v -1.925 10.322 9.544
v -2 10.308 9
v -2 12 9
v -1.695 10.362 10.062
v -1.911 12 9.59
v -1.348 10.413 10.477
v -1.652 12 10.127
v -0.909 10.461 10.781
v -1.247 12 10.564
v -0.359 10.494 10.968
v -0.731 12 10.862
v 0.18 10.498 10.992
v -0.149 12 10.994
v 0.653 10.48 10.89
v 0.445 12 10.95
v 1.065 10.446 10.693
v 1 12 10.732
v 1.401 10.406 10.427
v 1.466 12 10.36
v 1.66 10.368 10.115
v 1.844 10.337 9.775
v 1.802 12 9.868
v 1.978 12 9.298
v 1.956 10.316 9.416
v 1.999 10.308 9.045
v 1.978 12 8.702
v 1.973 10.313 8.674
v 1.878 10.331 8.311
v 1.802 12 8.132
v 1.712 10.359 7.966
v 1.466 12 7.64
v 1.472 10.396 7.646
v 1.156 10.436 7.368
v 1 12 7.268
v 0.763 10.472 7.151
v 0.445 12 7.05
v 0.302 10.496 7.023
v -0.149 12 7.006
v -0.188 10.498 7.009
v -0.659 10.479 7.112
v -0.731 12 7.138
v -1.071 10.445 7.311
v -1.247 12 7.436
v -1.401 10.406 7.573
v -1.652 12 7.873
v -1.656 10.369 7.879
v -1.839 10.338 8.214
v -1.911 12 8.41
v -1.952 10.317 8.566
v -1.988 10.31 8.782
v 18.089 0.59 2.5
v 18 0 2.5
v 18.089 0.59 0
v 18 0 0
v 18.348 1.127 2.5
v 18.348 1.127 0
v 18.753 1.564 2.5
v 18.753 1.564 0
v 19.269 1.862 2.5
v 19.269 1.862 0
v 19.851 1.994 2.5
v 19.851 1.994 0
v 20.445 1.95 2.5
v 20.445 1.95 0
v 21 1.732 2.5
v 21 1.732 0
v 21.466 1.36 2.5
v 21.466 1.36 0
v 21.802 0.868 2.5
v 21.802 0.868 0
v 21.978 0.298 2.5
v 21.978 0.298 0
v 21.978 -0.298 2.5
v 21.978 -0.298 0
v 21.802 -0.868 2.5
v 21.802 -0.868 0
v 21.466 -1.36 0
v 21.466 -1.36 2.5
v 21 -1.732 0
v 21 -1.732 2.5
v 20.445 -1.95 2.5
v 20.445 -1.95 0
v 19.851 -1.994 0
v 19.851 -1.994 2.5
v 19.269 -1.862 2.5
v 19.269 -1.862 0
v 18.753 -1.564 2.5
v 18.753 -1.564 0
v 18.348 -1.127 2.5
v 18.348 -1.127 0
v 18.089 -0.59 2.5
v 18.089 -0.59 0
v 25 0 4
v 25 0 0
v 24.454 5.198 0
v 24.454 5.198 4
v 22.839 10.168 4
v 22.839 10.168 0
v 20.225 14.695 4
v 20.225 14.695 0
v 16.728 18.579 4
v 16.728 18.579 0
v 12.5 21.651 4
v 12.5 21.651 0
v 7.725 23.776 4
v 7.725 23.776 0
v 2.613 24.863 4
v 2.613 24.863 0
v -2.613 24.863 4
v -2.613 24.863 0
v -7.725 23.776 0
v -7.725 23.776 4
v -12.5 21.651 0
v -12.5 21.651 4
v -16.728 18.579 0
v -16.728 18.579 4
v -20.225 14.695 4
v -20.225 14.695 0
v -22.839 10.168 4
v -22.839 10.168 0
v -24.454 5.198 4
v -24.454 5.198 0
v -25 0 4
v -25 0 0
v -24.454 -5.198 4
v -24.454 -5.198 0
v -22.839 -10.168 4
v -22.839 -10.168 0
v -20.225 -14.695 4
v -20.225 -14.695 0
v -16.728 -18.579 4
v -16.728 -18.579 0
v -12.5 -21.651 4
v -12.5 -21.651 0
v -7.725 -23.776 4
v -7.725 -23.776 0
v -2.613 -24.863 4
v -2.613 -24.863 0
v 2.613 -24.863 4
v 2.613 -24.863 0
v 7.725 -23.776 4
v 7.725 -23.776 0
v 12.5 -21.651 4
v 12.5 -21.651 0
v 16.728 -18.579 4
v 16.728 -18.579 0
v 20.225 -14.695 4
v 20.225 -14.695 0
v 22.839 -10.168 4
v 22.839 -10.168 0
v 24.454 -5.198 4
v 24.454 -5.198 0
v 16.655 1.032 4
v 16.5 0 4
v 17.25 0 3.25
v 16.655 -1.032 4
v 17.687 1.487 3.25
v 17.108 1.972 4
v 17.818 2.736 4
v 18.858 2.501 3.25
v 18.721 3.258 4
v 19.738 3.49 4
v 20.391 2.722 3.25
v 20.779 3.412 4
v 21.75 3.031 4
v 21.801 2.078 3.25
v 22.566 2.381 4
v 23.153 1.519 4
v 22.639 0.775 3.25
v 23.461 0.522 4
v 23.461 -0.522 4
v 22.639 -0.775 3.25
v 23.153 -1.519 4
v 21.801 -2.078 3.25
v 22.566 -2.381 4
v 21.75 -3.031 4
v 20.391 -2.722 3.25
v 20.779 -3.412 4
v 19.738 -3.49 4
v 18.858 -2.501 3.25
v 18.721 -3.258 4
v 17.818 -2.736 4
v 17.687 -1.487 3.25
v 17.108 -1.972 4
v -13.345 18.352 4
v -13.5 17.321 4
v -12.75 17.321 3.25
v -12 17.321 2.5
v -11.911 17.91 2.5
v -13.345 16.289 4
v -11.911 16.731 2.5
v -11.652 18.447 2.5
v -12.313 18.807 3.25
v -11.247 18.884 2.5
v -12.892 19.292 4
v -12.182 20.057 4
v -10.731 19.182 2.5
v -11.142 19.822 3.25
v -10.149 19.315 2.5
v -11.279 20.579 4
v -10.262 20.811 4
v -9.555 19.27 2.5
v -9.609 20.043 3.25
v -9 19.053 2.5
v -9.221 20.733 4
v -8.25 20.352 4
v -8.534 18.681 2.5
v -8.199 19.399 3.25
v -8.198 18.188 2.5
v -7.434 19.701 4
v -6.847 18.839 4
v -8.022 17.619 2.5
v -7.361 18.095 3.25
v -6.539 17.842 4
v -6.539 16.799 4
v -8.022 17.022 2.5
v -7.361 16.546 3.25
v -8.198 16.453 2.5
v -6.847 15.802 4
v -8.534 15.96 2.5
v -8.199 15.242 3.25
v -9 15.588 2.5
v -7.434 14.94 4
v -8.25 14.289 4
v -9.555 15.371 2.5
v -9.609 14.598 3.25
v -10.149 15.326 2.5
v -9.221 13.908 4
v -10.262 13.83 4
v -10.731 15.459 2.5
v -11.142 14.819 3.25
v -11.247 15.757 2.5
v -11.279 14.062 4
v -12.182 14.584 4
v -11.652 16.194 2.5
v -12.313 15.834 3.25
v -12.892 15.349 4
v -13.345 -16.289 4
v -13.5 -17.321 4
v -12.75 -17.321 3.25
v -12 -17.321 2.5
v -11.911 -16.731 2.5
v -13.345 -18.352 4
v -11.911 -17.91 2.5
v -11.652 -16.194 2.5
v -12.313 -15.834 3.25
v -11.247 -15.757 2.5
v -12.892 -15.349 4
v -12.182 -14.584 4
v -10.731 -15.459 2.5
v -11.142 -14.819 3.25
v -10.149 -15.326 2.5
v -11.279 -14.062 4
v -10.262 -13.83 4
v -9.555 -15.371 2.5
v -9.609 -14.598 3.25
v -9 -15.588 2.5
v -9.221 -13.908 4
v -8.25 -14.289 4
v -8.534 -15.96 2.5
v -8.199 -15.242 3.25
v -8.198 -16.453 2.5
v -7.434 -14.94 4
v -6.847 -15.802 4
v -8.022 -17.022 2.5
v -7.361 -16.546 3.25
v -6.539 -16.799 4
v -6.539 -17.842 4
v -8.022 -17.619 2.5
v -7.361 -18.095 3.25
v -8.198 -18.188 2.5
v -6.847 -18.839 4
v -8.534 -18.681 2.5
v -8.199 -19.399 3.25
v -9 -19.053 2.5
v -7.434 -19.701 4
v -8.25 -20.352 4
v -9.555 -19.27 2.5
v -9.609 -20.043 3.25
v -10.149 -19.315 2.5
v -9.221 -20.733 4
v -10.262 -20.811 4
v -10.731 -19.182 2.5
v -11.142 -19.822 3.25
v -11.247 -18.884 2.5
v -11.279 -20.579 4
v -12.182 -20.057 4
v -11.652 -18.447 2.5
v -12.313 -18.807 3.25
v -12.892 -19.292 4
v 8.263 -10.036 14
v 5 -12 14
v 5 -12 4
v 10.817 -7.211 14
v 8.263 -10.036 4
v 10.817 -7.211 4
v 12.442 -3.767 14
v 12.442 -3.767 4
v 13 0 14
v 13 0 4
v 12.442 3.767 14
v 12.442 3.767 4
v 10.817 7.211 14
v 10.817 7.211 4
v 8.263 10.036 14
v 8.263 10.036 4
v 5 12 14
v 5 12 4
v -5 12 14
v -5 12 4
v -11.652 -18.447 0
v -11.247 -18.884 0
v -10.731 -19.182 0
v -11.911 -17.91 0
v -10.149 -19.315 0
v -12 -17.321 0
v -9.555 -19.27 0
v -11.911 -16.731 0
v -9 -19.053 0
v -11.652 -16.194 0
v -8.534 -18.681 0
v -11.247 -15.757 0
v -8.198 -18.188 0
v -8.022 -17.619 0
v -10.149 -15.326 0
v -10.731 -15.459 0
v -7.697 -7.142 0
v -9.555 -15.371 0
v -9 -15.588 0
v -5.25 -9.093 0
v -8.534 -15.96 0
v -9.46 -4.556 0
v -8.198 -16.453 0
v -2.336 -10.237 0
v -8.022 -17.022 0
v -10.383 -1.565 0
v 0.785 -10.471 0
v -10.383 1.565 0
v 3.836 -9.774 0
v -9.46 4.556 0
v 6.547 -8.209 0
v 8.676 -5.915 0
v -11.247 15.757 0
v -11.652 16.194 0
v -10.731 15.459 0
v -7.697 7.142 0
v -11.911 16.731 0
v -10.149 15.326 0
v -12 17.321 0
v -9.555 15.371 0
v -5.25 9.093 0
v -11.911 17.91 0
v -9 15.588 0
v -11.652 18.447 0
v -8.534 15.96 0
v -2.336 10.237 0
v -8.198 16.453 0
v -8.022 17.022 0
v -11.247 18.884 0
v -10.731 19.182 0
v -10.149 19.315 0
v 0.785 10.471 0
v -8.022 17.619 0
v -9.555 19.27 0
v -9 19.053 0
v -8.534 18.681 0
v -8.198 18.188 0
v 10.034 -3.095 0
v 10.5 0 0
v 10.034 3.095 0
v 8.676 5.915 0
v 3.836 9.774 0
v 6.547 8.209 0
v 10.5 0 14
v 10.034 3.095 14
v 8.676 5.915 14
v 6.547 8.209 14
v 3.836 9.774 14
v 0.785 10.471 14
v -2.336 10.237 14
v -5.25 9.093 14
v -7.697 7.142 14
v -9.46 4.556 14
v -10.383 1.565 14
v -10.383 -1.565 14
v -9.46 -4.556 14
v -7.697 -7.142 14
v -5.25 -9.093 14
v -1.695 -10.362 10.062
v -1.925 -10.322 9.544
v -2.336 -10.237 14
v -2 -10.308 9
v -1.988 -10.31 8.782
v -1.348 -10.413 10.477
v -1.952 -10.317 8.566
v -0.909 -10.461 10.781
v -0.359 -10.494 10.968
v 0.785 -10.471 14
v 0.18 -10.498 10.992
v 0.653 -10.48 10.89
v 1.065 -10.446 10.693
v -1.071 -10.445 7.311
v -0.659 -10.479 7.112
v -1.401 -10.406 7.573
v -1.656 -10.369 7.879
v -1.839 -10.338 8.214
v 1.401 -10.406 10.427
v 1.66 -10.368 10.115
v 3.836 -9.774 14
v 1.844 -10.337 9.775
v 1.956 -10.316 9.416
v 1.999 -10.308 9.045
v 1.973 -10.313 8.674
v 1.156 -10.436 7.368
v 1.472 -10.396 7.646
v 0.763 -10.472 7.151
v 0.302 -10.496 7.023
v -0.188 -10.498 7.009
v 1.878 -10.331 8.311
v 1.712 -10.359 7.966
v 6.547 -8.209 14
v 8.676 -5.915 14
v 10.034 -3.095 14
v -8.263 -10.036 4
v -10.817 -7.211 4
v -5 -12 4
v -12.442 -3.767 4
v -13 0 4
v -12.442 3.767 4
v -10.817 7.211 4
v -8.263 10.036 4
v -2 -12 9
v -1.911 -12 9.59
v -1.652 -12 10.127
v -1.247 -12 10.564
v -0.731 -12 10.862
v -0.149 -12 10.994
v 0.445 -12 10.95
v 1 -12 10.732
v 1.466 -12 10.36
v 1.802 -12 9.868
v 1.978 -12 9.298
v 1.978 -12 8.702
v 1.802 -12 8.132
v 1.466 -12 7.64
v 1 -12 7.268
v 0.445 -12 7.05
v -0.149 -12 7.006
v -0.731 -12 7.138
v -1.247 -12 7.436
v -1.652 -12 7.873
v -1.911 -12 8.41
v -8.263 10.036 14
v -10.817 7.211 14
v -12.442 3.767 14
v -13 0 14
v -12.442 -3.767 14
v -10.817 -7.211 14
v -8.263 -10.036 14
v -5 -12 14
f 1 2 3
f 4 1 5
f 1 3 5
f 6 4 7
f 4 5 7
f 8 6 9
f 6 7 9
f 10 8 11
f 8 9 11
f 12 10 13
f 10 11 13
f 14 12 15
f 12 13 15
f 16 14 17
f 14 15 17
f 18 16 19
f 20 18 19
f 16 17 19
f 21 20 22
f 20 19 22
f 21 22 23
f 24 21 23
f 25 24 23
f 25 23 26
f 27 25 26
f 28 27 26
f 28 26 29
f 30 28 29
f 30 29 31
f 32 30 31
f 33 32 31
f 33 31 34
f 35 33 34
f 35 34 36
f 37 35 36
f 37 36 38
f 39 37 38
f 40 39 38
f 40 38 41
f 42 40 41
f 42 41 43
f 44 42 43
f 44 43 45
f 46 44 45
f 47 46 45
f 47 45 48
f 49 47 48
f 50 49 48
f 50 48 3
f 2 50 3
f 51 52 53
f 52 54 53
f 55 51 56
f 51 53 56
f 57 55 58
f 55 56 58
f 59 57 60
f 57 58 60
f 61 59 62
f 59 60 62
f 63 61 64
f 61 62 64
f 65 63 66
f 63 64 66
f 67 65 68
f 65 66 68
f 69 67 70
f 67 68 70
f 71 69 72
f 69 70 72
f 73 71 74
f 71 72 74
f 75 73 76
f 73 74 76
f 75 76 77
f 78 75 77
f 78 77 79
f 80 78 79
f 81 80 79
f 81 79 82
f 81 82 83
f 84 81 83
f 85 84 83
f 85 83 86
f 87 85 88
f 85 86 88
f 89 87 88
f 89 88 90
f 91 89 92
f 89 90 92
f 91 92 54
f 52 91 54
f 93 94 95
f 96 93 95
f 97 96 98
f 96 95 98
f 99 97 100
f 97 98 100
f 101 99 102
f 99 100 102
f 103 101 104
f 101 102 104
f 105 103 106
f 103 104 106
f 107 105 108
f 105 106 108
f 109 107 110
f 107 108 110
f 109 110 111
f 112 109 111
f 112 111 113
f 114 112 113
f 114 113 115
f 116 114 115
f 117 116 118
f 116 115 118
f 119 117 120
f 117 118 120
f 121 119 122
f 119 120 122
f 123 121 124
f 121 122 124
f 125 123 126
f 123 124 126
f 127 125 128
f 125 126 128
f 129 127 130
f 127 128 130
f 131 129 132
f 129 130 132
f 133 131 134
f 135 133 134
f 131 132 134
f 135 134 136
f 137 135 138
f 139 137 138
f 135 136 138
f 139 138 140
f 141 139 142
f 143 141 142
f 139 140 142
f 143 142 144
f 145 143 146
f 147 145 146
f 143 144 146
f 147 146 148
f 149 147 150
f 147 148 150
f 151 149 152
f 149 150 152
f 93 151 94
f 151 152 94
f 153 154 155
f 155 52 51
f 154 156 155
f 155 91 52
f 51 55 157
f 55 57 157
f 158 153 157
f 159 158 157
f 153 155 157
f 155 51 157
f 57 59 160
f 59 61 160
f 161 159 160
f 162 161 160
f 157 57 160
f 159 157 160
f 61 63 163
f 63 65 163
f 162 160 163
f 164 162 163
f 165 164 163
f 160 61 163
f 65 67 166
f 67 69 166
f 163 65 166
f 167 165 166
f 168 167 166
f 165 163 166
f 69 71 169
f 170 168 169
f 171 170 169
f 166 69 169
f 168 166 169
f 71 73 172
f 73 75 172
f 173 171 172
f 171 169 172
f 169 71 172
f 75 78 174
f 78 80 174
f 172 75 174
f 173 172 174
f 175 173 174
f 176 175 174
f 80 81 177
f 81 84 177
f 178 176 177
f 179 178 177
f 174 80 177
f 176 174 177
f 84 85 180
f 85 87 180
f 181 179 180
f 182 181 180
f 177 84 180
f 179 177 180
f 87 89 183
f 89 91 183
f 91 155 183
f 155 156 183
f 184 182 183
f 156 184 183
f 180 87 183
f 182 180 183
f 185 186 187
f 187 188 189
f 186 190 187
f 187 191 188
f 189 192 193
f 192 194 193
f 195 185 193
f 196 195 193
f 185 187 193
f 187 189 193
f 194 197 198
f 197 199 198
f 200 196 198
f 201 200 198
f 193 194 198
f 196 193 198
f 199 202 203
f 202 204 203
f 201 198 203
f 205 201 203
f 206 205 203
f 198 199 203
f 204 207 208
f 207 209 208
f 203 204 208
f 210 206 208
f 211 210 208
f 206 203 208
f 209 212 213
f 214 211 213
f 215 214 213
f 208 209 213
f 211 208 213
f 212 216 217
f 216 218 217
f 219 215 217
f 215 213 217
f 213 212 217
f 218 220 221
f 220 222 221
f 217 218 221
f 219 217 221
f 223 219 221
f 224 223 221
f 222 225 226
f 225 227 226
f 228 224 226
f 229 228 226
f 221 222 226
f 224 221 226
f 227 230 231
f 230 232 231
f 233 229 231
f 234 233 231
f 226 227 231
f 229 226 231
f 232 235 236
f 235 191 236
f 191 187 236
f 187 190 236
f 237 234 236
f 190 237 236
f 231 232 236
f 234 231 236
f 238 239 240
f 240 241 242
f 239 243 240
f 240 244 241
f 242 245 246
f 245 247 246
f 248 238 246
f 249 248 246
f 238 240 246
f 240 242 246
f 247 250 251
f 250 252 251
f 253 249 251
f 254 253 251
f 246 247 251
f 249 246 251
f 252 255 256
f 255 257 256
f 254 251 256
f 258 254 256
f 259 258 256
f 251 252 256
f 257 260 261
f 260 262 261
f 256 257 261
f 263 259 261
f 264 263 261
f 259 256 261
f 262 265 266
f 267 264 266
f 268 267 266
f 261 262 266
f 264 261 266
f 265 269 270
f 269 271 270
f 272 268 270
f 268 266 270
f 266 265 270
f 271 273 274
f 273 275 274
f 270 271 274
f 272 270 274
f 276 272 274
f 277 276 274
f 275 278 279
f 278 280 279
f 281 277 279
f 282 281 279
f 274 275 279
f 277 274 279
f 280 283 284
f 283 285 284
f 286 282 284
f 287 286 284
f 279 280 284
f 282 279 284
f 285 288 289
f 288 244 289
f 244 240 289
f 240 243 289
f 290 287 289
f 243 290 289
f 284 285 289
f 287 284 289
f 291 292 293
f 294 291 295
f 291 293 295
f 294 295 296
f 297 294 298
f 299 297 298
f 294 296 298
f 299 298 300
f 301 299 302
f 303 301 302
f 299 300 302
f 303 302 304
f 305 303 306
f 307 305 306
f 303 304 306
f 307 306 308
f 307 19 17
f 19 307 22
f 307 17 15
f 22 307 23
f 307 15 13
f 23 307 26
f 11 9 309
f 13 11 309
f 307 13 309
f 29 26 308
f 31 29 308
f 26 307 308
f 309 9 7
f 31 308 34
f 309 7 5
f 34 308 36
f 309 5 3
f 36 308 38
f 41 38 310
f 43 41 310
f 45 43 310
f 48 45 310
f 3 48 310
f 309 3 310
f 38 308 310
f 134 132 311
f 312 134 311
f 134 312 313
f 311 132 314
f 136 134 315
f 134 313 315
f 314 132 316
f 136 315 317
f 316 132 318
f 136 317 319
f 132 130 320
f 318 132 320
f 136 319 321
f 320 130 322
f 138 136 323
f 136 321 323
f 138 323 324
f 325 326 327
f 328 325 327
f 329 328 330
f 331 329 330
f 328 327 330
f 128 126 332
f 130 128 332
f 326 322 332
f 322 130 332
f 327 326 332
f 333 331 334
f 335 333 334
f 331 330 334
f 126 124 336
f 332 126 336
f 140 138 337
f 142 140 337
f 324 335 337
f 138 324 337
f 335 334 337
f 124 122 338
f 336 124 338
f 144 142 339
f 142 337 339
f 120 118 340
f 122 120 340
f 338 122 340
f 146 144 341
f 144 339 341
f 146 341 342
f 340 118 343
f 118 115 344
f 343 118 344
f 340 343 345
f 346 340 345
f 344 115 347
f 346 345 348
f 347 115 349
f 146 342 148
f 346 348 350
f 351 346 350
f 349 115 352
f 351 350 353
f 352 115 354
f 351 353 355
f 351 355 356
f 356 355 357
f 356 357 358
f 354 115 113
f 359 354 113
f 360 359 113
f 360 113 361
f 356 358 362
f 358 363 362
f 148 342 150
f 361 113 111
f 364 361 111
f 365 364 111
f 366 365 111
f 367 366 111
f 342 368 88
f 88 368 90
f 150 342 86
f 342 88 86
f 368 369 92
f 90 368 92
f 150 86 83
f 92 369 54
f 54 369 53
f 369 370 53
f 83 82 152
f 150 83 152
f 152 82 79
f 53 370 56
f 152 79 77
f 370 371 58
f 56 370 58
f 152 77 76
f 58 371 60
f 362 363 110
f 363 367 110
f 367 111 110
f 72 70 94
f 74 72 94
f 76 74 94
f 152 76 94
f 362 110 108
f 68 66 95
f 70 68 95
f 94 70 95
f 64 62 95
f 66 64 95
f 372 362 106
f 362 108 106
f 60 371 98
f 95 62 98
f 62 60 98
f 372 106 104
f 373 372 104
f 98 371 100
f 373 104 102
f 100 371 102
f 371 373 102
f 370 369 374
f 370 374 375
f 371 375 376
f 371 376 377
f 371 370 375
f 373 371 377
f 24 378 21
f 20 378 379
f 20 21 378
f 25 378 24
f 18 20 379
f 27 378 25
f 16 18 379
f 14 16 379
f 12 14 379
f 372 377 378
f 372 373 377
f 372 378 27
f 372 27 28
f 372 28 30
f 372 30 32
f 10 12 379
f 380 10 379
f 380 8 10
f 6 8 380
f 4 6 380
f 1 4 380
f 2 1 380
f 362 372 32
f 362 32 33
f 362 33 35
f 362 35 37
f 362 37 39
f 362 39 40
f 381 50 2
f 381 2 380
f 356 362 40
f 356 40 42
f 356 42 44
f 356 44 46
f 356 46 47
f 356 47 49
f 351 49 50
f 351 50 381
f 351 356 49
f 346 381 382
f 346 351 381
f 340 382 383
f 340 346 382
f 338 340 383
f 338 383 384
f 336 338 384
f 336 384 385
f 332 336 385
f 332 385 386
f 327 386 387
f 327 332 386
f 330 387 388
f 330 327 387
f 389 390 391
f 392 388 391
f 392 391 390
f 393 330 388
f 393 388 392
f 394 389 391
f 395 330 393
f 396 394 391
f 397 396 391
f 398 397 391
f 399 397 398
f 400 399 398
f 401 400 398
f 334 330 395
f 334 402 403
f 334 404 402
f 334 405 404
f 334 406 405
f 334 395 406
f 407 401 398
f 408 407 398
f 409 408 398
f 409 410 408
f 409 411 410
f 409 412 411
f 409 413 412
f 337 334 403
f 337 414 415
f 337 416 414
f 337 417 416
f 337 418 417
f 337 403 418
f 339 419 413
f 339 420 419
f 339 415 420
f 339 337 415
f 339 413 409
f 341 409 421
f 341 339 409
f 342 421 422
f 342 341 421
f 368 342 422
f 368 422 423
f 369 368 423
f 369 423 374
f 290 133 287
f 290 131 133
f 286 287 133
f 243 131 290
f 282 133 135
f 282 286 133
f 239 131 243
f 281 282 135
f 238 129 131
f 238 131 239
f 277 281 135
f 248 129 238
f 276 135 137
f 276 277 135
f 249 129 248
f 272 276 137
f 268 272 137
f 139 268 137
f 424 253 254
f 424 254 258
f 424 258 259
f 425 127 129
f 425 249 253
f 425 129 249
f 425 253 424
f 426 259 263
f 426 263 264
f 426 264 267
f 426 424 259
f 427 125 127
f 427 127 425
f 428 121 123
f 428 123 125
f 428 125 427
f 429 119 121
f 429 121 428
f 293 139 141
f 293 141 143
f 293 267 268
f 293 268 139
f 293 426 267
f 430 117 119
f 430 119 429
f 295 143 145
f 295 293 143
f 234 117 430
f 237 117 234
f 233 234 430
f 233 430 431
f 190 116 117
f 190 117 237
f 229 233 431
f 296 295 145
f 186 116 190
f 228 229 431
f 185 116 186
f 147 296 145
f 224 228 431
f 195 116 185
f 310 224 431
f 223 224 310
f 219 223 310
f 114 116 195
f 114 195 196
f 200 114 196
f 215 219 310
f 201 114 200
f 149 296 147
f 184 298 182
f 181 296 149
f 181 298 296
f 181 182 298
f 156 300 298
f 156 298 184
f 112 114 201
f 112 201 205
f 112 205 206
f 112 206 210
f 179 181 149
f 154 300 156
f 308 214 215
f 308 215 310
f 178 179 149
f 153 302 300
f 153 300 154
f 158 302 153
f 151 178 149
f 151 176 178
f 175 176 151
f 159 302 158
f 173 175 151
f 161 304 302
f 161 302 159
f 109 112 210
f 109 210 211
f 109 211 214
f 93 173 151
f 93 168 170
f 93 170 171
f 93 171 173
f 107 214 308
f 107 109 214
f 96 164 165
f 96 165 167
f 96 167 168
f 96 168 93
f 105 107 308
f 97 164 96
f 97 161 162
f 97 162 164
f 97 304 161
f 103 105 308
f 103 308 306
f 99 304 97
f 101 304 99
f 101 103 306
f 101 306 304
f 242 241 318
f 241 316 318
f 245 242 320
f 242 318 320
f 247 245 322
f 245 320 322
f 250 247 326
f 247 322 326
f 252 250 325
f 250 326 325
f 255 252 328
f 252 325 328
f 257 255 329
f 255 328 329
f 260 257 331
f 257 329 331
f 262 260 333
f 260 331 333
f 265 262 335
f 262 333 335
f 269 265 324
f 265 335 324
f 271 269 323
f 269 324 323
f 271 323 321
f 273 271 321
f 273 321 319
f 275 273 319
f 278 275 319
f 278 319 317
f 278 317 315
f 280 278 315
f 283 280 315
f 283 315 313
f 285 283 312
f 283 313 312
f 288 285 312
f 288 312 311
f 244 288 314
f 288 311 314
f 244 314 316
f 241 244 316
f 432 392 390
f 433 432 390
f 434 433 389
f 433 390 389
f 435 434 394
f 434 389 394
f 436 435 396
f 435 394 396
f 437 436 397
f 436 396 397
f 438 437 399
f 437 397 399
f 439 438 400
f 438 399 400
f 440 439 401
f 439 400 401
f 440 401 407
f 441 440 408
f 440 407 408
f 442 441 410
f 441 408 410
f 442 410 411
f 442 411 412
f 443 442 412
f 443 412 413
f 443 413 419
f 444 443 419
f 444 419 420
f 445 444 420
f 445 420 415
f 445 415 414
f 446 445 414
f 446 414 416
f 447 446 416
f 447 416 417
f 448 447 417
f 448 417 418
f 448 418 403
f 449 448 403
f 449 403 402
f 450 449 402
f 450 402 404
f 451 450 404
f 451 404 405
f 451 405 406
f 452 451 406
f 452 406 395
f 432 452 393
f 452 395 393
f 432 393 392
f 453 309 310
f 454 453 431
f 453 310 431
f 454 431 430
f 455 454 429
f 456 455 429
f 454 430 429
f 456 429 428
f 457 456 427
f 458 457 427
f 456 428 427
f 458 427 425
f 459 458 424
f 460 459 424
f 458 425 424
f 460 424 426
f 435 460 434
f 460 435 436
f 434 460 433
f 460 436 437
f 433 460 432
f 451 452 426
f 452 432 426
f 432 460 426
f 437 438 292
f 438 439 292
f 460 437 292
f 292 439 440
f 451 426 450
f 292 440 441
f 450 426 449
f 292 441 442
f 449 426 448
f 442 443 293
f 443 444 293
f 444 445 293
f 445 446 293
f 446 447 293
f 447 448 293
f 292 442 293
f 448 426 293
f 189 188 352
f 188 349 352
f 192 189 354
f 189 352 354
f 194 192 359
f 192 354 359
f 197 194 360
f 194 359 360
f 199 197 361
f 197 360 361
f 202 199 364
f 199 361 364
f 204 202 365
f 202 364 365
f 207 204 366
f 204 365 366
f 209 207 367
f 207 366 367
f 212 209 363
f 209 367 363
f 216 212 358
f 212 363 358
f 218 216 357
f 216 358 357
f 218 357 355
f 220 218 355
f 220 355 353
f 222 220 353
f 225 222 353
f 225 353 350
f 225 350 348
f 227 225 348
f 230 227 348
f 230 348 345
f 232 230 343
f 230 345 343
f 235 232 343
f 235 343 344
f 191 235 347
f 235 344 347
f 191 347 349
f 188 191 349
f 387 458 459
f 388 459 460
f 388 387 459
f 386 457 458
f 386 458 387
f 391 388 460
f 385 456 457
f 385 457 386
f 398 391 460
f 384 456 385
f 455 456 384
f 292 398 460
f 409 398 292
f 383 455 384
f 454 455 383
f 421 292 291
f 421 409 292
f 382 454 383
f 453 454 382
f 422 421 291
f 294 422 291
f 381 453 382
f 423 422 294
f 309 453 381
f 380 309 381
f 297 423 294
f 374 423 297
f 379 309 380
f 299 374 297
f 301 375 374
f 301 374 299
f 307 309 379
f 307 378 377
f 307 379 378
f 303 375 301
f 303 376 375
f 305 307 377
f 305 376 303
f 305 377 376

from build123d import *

# Parameters (mm, degrees)
F0_R           = 25
F0_R_2         = 10.5
F1_DEPTH       = 4
F2_R           = 10.5
F3_DEPTH       = 10
F5_D           = 4
F5_CSINK_D     = 7
F5_CSINK_ANGLE = 90
F7_D           = 4


with BuildPart() as f1:
    # F0 (on Top) → F1 (new body)
    with BuildSketch(Plane.XY):
        Circle(F0_R)
        Circle(F0_R_2, mode=Mode.SUBTRACT)
    extrude(amount=F1_DEPTH)

    # F2 (on face) → F3 (join)
    with BuildSketch(Plane.XY.offset(4)):
        with BuildLine():
            Line((-5, -12), (5, -12))
            ThreePointArc((5, -12), (13, 0), (5, 12))
            Line((5, 12), (-5, 12))
            ThreePointArc((-5, 12), (-13, 0), (-5, -12))
        make_face()
        Circle(F2_R, mode=Mode.SUBTRACT)
    extrude(amount=F3_DEPTH)

    # F5 (through all)
    with Locations(Plane.XY.offset(4)):
        with Locations((-10, -17.320508), (-10, 17.320508), (20, 0)):
            CounterSinkHole(F5_D / 2, F5_CSINK_D / 2, counter_sink_angle=F5_CSINK_ANGLE)

    # F7 (through all)
    with Locations(Plane.XZ.offset(12)):
        with Locations((0, 9)):
            Hole(F7_D / 2)


solid = f1.part
